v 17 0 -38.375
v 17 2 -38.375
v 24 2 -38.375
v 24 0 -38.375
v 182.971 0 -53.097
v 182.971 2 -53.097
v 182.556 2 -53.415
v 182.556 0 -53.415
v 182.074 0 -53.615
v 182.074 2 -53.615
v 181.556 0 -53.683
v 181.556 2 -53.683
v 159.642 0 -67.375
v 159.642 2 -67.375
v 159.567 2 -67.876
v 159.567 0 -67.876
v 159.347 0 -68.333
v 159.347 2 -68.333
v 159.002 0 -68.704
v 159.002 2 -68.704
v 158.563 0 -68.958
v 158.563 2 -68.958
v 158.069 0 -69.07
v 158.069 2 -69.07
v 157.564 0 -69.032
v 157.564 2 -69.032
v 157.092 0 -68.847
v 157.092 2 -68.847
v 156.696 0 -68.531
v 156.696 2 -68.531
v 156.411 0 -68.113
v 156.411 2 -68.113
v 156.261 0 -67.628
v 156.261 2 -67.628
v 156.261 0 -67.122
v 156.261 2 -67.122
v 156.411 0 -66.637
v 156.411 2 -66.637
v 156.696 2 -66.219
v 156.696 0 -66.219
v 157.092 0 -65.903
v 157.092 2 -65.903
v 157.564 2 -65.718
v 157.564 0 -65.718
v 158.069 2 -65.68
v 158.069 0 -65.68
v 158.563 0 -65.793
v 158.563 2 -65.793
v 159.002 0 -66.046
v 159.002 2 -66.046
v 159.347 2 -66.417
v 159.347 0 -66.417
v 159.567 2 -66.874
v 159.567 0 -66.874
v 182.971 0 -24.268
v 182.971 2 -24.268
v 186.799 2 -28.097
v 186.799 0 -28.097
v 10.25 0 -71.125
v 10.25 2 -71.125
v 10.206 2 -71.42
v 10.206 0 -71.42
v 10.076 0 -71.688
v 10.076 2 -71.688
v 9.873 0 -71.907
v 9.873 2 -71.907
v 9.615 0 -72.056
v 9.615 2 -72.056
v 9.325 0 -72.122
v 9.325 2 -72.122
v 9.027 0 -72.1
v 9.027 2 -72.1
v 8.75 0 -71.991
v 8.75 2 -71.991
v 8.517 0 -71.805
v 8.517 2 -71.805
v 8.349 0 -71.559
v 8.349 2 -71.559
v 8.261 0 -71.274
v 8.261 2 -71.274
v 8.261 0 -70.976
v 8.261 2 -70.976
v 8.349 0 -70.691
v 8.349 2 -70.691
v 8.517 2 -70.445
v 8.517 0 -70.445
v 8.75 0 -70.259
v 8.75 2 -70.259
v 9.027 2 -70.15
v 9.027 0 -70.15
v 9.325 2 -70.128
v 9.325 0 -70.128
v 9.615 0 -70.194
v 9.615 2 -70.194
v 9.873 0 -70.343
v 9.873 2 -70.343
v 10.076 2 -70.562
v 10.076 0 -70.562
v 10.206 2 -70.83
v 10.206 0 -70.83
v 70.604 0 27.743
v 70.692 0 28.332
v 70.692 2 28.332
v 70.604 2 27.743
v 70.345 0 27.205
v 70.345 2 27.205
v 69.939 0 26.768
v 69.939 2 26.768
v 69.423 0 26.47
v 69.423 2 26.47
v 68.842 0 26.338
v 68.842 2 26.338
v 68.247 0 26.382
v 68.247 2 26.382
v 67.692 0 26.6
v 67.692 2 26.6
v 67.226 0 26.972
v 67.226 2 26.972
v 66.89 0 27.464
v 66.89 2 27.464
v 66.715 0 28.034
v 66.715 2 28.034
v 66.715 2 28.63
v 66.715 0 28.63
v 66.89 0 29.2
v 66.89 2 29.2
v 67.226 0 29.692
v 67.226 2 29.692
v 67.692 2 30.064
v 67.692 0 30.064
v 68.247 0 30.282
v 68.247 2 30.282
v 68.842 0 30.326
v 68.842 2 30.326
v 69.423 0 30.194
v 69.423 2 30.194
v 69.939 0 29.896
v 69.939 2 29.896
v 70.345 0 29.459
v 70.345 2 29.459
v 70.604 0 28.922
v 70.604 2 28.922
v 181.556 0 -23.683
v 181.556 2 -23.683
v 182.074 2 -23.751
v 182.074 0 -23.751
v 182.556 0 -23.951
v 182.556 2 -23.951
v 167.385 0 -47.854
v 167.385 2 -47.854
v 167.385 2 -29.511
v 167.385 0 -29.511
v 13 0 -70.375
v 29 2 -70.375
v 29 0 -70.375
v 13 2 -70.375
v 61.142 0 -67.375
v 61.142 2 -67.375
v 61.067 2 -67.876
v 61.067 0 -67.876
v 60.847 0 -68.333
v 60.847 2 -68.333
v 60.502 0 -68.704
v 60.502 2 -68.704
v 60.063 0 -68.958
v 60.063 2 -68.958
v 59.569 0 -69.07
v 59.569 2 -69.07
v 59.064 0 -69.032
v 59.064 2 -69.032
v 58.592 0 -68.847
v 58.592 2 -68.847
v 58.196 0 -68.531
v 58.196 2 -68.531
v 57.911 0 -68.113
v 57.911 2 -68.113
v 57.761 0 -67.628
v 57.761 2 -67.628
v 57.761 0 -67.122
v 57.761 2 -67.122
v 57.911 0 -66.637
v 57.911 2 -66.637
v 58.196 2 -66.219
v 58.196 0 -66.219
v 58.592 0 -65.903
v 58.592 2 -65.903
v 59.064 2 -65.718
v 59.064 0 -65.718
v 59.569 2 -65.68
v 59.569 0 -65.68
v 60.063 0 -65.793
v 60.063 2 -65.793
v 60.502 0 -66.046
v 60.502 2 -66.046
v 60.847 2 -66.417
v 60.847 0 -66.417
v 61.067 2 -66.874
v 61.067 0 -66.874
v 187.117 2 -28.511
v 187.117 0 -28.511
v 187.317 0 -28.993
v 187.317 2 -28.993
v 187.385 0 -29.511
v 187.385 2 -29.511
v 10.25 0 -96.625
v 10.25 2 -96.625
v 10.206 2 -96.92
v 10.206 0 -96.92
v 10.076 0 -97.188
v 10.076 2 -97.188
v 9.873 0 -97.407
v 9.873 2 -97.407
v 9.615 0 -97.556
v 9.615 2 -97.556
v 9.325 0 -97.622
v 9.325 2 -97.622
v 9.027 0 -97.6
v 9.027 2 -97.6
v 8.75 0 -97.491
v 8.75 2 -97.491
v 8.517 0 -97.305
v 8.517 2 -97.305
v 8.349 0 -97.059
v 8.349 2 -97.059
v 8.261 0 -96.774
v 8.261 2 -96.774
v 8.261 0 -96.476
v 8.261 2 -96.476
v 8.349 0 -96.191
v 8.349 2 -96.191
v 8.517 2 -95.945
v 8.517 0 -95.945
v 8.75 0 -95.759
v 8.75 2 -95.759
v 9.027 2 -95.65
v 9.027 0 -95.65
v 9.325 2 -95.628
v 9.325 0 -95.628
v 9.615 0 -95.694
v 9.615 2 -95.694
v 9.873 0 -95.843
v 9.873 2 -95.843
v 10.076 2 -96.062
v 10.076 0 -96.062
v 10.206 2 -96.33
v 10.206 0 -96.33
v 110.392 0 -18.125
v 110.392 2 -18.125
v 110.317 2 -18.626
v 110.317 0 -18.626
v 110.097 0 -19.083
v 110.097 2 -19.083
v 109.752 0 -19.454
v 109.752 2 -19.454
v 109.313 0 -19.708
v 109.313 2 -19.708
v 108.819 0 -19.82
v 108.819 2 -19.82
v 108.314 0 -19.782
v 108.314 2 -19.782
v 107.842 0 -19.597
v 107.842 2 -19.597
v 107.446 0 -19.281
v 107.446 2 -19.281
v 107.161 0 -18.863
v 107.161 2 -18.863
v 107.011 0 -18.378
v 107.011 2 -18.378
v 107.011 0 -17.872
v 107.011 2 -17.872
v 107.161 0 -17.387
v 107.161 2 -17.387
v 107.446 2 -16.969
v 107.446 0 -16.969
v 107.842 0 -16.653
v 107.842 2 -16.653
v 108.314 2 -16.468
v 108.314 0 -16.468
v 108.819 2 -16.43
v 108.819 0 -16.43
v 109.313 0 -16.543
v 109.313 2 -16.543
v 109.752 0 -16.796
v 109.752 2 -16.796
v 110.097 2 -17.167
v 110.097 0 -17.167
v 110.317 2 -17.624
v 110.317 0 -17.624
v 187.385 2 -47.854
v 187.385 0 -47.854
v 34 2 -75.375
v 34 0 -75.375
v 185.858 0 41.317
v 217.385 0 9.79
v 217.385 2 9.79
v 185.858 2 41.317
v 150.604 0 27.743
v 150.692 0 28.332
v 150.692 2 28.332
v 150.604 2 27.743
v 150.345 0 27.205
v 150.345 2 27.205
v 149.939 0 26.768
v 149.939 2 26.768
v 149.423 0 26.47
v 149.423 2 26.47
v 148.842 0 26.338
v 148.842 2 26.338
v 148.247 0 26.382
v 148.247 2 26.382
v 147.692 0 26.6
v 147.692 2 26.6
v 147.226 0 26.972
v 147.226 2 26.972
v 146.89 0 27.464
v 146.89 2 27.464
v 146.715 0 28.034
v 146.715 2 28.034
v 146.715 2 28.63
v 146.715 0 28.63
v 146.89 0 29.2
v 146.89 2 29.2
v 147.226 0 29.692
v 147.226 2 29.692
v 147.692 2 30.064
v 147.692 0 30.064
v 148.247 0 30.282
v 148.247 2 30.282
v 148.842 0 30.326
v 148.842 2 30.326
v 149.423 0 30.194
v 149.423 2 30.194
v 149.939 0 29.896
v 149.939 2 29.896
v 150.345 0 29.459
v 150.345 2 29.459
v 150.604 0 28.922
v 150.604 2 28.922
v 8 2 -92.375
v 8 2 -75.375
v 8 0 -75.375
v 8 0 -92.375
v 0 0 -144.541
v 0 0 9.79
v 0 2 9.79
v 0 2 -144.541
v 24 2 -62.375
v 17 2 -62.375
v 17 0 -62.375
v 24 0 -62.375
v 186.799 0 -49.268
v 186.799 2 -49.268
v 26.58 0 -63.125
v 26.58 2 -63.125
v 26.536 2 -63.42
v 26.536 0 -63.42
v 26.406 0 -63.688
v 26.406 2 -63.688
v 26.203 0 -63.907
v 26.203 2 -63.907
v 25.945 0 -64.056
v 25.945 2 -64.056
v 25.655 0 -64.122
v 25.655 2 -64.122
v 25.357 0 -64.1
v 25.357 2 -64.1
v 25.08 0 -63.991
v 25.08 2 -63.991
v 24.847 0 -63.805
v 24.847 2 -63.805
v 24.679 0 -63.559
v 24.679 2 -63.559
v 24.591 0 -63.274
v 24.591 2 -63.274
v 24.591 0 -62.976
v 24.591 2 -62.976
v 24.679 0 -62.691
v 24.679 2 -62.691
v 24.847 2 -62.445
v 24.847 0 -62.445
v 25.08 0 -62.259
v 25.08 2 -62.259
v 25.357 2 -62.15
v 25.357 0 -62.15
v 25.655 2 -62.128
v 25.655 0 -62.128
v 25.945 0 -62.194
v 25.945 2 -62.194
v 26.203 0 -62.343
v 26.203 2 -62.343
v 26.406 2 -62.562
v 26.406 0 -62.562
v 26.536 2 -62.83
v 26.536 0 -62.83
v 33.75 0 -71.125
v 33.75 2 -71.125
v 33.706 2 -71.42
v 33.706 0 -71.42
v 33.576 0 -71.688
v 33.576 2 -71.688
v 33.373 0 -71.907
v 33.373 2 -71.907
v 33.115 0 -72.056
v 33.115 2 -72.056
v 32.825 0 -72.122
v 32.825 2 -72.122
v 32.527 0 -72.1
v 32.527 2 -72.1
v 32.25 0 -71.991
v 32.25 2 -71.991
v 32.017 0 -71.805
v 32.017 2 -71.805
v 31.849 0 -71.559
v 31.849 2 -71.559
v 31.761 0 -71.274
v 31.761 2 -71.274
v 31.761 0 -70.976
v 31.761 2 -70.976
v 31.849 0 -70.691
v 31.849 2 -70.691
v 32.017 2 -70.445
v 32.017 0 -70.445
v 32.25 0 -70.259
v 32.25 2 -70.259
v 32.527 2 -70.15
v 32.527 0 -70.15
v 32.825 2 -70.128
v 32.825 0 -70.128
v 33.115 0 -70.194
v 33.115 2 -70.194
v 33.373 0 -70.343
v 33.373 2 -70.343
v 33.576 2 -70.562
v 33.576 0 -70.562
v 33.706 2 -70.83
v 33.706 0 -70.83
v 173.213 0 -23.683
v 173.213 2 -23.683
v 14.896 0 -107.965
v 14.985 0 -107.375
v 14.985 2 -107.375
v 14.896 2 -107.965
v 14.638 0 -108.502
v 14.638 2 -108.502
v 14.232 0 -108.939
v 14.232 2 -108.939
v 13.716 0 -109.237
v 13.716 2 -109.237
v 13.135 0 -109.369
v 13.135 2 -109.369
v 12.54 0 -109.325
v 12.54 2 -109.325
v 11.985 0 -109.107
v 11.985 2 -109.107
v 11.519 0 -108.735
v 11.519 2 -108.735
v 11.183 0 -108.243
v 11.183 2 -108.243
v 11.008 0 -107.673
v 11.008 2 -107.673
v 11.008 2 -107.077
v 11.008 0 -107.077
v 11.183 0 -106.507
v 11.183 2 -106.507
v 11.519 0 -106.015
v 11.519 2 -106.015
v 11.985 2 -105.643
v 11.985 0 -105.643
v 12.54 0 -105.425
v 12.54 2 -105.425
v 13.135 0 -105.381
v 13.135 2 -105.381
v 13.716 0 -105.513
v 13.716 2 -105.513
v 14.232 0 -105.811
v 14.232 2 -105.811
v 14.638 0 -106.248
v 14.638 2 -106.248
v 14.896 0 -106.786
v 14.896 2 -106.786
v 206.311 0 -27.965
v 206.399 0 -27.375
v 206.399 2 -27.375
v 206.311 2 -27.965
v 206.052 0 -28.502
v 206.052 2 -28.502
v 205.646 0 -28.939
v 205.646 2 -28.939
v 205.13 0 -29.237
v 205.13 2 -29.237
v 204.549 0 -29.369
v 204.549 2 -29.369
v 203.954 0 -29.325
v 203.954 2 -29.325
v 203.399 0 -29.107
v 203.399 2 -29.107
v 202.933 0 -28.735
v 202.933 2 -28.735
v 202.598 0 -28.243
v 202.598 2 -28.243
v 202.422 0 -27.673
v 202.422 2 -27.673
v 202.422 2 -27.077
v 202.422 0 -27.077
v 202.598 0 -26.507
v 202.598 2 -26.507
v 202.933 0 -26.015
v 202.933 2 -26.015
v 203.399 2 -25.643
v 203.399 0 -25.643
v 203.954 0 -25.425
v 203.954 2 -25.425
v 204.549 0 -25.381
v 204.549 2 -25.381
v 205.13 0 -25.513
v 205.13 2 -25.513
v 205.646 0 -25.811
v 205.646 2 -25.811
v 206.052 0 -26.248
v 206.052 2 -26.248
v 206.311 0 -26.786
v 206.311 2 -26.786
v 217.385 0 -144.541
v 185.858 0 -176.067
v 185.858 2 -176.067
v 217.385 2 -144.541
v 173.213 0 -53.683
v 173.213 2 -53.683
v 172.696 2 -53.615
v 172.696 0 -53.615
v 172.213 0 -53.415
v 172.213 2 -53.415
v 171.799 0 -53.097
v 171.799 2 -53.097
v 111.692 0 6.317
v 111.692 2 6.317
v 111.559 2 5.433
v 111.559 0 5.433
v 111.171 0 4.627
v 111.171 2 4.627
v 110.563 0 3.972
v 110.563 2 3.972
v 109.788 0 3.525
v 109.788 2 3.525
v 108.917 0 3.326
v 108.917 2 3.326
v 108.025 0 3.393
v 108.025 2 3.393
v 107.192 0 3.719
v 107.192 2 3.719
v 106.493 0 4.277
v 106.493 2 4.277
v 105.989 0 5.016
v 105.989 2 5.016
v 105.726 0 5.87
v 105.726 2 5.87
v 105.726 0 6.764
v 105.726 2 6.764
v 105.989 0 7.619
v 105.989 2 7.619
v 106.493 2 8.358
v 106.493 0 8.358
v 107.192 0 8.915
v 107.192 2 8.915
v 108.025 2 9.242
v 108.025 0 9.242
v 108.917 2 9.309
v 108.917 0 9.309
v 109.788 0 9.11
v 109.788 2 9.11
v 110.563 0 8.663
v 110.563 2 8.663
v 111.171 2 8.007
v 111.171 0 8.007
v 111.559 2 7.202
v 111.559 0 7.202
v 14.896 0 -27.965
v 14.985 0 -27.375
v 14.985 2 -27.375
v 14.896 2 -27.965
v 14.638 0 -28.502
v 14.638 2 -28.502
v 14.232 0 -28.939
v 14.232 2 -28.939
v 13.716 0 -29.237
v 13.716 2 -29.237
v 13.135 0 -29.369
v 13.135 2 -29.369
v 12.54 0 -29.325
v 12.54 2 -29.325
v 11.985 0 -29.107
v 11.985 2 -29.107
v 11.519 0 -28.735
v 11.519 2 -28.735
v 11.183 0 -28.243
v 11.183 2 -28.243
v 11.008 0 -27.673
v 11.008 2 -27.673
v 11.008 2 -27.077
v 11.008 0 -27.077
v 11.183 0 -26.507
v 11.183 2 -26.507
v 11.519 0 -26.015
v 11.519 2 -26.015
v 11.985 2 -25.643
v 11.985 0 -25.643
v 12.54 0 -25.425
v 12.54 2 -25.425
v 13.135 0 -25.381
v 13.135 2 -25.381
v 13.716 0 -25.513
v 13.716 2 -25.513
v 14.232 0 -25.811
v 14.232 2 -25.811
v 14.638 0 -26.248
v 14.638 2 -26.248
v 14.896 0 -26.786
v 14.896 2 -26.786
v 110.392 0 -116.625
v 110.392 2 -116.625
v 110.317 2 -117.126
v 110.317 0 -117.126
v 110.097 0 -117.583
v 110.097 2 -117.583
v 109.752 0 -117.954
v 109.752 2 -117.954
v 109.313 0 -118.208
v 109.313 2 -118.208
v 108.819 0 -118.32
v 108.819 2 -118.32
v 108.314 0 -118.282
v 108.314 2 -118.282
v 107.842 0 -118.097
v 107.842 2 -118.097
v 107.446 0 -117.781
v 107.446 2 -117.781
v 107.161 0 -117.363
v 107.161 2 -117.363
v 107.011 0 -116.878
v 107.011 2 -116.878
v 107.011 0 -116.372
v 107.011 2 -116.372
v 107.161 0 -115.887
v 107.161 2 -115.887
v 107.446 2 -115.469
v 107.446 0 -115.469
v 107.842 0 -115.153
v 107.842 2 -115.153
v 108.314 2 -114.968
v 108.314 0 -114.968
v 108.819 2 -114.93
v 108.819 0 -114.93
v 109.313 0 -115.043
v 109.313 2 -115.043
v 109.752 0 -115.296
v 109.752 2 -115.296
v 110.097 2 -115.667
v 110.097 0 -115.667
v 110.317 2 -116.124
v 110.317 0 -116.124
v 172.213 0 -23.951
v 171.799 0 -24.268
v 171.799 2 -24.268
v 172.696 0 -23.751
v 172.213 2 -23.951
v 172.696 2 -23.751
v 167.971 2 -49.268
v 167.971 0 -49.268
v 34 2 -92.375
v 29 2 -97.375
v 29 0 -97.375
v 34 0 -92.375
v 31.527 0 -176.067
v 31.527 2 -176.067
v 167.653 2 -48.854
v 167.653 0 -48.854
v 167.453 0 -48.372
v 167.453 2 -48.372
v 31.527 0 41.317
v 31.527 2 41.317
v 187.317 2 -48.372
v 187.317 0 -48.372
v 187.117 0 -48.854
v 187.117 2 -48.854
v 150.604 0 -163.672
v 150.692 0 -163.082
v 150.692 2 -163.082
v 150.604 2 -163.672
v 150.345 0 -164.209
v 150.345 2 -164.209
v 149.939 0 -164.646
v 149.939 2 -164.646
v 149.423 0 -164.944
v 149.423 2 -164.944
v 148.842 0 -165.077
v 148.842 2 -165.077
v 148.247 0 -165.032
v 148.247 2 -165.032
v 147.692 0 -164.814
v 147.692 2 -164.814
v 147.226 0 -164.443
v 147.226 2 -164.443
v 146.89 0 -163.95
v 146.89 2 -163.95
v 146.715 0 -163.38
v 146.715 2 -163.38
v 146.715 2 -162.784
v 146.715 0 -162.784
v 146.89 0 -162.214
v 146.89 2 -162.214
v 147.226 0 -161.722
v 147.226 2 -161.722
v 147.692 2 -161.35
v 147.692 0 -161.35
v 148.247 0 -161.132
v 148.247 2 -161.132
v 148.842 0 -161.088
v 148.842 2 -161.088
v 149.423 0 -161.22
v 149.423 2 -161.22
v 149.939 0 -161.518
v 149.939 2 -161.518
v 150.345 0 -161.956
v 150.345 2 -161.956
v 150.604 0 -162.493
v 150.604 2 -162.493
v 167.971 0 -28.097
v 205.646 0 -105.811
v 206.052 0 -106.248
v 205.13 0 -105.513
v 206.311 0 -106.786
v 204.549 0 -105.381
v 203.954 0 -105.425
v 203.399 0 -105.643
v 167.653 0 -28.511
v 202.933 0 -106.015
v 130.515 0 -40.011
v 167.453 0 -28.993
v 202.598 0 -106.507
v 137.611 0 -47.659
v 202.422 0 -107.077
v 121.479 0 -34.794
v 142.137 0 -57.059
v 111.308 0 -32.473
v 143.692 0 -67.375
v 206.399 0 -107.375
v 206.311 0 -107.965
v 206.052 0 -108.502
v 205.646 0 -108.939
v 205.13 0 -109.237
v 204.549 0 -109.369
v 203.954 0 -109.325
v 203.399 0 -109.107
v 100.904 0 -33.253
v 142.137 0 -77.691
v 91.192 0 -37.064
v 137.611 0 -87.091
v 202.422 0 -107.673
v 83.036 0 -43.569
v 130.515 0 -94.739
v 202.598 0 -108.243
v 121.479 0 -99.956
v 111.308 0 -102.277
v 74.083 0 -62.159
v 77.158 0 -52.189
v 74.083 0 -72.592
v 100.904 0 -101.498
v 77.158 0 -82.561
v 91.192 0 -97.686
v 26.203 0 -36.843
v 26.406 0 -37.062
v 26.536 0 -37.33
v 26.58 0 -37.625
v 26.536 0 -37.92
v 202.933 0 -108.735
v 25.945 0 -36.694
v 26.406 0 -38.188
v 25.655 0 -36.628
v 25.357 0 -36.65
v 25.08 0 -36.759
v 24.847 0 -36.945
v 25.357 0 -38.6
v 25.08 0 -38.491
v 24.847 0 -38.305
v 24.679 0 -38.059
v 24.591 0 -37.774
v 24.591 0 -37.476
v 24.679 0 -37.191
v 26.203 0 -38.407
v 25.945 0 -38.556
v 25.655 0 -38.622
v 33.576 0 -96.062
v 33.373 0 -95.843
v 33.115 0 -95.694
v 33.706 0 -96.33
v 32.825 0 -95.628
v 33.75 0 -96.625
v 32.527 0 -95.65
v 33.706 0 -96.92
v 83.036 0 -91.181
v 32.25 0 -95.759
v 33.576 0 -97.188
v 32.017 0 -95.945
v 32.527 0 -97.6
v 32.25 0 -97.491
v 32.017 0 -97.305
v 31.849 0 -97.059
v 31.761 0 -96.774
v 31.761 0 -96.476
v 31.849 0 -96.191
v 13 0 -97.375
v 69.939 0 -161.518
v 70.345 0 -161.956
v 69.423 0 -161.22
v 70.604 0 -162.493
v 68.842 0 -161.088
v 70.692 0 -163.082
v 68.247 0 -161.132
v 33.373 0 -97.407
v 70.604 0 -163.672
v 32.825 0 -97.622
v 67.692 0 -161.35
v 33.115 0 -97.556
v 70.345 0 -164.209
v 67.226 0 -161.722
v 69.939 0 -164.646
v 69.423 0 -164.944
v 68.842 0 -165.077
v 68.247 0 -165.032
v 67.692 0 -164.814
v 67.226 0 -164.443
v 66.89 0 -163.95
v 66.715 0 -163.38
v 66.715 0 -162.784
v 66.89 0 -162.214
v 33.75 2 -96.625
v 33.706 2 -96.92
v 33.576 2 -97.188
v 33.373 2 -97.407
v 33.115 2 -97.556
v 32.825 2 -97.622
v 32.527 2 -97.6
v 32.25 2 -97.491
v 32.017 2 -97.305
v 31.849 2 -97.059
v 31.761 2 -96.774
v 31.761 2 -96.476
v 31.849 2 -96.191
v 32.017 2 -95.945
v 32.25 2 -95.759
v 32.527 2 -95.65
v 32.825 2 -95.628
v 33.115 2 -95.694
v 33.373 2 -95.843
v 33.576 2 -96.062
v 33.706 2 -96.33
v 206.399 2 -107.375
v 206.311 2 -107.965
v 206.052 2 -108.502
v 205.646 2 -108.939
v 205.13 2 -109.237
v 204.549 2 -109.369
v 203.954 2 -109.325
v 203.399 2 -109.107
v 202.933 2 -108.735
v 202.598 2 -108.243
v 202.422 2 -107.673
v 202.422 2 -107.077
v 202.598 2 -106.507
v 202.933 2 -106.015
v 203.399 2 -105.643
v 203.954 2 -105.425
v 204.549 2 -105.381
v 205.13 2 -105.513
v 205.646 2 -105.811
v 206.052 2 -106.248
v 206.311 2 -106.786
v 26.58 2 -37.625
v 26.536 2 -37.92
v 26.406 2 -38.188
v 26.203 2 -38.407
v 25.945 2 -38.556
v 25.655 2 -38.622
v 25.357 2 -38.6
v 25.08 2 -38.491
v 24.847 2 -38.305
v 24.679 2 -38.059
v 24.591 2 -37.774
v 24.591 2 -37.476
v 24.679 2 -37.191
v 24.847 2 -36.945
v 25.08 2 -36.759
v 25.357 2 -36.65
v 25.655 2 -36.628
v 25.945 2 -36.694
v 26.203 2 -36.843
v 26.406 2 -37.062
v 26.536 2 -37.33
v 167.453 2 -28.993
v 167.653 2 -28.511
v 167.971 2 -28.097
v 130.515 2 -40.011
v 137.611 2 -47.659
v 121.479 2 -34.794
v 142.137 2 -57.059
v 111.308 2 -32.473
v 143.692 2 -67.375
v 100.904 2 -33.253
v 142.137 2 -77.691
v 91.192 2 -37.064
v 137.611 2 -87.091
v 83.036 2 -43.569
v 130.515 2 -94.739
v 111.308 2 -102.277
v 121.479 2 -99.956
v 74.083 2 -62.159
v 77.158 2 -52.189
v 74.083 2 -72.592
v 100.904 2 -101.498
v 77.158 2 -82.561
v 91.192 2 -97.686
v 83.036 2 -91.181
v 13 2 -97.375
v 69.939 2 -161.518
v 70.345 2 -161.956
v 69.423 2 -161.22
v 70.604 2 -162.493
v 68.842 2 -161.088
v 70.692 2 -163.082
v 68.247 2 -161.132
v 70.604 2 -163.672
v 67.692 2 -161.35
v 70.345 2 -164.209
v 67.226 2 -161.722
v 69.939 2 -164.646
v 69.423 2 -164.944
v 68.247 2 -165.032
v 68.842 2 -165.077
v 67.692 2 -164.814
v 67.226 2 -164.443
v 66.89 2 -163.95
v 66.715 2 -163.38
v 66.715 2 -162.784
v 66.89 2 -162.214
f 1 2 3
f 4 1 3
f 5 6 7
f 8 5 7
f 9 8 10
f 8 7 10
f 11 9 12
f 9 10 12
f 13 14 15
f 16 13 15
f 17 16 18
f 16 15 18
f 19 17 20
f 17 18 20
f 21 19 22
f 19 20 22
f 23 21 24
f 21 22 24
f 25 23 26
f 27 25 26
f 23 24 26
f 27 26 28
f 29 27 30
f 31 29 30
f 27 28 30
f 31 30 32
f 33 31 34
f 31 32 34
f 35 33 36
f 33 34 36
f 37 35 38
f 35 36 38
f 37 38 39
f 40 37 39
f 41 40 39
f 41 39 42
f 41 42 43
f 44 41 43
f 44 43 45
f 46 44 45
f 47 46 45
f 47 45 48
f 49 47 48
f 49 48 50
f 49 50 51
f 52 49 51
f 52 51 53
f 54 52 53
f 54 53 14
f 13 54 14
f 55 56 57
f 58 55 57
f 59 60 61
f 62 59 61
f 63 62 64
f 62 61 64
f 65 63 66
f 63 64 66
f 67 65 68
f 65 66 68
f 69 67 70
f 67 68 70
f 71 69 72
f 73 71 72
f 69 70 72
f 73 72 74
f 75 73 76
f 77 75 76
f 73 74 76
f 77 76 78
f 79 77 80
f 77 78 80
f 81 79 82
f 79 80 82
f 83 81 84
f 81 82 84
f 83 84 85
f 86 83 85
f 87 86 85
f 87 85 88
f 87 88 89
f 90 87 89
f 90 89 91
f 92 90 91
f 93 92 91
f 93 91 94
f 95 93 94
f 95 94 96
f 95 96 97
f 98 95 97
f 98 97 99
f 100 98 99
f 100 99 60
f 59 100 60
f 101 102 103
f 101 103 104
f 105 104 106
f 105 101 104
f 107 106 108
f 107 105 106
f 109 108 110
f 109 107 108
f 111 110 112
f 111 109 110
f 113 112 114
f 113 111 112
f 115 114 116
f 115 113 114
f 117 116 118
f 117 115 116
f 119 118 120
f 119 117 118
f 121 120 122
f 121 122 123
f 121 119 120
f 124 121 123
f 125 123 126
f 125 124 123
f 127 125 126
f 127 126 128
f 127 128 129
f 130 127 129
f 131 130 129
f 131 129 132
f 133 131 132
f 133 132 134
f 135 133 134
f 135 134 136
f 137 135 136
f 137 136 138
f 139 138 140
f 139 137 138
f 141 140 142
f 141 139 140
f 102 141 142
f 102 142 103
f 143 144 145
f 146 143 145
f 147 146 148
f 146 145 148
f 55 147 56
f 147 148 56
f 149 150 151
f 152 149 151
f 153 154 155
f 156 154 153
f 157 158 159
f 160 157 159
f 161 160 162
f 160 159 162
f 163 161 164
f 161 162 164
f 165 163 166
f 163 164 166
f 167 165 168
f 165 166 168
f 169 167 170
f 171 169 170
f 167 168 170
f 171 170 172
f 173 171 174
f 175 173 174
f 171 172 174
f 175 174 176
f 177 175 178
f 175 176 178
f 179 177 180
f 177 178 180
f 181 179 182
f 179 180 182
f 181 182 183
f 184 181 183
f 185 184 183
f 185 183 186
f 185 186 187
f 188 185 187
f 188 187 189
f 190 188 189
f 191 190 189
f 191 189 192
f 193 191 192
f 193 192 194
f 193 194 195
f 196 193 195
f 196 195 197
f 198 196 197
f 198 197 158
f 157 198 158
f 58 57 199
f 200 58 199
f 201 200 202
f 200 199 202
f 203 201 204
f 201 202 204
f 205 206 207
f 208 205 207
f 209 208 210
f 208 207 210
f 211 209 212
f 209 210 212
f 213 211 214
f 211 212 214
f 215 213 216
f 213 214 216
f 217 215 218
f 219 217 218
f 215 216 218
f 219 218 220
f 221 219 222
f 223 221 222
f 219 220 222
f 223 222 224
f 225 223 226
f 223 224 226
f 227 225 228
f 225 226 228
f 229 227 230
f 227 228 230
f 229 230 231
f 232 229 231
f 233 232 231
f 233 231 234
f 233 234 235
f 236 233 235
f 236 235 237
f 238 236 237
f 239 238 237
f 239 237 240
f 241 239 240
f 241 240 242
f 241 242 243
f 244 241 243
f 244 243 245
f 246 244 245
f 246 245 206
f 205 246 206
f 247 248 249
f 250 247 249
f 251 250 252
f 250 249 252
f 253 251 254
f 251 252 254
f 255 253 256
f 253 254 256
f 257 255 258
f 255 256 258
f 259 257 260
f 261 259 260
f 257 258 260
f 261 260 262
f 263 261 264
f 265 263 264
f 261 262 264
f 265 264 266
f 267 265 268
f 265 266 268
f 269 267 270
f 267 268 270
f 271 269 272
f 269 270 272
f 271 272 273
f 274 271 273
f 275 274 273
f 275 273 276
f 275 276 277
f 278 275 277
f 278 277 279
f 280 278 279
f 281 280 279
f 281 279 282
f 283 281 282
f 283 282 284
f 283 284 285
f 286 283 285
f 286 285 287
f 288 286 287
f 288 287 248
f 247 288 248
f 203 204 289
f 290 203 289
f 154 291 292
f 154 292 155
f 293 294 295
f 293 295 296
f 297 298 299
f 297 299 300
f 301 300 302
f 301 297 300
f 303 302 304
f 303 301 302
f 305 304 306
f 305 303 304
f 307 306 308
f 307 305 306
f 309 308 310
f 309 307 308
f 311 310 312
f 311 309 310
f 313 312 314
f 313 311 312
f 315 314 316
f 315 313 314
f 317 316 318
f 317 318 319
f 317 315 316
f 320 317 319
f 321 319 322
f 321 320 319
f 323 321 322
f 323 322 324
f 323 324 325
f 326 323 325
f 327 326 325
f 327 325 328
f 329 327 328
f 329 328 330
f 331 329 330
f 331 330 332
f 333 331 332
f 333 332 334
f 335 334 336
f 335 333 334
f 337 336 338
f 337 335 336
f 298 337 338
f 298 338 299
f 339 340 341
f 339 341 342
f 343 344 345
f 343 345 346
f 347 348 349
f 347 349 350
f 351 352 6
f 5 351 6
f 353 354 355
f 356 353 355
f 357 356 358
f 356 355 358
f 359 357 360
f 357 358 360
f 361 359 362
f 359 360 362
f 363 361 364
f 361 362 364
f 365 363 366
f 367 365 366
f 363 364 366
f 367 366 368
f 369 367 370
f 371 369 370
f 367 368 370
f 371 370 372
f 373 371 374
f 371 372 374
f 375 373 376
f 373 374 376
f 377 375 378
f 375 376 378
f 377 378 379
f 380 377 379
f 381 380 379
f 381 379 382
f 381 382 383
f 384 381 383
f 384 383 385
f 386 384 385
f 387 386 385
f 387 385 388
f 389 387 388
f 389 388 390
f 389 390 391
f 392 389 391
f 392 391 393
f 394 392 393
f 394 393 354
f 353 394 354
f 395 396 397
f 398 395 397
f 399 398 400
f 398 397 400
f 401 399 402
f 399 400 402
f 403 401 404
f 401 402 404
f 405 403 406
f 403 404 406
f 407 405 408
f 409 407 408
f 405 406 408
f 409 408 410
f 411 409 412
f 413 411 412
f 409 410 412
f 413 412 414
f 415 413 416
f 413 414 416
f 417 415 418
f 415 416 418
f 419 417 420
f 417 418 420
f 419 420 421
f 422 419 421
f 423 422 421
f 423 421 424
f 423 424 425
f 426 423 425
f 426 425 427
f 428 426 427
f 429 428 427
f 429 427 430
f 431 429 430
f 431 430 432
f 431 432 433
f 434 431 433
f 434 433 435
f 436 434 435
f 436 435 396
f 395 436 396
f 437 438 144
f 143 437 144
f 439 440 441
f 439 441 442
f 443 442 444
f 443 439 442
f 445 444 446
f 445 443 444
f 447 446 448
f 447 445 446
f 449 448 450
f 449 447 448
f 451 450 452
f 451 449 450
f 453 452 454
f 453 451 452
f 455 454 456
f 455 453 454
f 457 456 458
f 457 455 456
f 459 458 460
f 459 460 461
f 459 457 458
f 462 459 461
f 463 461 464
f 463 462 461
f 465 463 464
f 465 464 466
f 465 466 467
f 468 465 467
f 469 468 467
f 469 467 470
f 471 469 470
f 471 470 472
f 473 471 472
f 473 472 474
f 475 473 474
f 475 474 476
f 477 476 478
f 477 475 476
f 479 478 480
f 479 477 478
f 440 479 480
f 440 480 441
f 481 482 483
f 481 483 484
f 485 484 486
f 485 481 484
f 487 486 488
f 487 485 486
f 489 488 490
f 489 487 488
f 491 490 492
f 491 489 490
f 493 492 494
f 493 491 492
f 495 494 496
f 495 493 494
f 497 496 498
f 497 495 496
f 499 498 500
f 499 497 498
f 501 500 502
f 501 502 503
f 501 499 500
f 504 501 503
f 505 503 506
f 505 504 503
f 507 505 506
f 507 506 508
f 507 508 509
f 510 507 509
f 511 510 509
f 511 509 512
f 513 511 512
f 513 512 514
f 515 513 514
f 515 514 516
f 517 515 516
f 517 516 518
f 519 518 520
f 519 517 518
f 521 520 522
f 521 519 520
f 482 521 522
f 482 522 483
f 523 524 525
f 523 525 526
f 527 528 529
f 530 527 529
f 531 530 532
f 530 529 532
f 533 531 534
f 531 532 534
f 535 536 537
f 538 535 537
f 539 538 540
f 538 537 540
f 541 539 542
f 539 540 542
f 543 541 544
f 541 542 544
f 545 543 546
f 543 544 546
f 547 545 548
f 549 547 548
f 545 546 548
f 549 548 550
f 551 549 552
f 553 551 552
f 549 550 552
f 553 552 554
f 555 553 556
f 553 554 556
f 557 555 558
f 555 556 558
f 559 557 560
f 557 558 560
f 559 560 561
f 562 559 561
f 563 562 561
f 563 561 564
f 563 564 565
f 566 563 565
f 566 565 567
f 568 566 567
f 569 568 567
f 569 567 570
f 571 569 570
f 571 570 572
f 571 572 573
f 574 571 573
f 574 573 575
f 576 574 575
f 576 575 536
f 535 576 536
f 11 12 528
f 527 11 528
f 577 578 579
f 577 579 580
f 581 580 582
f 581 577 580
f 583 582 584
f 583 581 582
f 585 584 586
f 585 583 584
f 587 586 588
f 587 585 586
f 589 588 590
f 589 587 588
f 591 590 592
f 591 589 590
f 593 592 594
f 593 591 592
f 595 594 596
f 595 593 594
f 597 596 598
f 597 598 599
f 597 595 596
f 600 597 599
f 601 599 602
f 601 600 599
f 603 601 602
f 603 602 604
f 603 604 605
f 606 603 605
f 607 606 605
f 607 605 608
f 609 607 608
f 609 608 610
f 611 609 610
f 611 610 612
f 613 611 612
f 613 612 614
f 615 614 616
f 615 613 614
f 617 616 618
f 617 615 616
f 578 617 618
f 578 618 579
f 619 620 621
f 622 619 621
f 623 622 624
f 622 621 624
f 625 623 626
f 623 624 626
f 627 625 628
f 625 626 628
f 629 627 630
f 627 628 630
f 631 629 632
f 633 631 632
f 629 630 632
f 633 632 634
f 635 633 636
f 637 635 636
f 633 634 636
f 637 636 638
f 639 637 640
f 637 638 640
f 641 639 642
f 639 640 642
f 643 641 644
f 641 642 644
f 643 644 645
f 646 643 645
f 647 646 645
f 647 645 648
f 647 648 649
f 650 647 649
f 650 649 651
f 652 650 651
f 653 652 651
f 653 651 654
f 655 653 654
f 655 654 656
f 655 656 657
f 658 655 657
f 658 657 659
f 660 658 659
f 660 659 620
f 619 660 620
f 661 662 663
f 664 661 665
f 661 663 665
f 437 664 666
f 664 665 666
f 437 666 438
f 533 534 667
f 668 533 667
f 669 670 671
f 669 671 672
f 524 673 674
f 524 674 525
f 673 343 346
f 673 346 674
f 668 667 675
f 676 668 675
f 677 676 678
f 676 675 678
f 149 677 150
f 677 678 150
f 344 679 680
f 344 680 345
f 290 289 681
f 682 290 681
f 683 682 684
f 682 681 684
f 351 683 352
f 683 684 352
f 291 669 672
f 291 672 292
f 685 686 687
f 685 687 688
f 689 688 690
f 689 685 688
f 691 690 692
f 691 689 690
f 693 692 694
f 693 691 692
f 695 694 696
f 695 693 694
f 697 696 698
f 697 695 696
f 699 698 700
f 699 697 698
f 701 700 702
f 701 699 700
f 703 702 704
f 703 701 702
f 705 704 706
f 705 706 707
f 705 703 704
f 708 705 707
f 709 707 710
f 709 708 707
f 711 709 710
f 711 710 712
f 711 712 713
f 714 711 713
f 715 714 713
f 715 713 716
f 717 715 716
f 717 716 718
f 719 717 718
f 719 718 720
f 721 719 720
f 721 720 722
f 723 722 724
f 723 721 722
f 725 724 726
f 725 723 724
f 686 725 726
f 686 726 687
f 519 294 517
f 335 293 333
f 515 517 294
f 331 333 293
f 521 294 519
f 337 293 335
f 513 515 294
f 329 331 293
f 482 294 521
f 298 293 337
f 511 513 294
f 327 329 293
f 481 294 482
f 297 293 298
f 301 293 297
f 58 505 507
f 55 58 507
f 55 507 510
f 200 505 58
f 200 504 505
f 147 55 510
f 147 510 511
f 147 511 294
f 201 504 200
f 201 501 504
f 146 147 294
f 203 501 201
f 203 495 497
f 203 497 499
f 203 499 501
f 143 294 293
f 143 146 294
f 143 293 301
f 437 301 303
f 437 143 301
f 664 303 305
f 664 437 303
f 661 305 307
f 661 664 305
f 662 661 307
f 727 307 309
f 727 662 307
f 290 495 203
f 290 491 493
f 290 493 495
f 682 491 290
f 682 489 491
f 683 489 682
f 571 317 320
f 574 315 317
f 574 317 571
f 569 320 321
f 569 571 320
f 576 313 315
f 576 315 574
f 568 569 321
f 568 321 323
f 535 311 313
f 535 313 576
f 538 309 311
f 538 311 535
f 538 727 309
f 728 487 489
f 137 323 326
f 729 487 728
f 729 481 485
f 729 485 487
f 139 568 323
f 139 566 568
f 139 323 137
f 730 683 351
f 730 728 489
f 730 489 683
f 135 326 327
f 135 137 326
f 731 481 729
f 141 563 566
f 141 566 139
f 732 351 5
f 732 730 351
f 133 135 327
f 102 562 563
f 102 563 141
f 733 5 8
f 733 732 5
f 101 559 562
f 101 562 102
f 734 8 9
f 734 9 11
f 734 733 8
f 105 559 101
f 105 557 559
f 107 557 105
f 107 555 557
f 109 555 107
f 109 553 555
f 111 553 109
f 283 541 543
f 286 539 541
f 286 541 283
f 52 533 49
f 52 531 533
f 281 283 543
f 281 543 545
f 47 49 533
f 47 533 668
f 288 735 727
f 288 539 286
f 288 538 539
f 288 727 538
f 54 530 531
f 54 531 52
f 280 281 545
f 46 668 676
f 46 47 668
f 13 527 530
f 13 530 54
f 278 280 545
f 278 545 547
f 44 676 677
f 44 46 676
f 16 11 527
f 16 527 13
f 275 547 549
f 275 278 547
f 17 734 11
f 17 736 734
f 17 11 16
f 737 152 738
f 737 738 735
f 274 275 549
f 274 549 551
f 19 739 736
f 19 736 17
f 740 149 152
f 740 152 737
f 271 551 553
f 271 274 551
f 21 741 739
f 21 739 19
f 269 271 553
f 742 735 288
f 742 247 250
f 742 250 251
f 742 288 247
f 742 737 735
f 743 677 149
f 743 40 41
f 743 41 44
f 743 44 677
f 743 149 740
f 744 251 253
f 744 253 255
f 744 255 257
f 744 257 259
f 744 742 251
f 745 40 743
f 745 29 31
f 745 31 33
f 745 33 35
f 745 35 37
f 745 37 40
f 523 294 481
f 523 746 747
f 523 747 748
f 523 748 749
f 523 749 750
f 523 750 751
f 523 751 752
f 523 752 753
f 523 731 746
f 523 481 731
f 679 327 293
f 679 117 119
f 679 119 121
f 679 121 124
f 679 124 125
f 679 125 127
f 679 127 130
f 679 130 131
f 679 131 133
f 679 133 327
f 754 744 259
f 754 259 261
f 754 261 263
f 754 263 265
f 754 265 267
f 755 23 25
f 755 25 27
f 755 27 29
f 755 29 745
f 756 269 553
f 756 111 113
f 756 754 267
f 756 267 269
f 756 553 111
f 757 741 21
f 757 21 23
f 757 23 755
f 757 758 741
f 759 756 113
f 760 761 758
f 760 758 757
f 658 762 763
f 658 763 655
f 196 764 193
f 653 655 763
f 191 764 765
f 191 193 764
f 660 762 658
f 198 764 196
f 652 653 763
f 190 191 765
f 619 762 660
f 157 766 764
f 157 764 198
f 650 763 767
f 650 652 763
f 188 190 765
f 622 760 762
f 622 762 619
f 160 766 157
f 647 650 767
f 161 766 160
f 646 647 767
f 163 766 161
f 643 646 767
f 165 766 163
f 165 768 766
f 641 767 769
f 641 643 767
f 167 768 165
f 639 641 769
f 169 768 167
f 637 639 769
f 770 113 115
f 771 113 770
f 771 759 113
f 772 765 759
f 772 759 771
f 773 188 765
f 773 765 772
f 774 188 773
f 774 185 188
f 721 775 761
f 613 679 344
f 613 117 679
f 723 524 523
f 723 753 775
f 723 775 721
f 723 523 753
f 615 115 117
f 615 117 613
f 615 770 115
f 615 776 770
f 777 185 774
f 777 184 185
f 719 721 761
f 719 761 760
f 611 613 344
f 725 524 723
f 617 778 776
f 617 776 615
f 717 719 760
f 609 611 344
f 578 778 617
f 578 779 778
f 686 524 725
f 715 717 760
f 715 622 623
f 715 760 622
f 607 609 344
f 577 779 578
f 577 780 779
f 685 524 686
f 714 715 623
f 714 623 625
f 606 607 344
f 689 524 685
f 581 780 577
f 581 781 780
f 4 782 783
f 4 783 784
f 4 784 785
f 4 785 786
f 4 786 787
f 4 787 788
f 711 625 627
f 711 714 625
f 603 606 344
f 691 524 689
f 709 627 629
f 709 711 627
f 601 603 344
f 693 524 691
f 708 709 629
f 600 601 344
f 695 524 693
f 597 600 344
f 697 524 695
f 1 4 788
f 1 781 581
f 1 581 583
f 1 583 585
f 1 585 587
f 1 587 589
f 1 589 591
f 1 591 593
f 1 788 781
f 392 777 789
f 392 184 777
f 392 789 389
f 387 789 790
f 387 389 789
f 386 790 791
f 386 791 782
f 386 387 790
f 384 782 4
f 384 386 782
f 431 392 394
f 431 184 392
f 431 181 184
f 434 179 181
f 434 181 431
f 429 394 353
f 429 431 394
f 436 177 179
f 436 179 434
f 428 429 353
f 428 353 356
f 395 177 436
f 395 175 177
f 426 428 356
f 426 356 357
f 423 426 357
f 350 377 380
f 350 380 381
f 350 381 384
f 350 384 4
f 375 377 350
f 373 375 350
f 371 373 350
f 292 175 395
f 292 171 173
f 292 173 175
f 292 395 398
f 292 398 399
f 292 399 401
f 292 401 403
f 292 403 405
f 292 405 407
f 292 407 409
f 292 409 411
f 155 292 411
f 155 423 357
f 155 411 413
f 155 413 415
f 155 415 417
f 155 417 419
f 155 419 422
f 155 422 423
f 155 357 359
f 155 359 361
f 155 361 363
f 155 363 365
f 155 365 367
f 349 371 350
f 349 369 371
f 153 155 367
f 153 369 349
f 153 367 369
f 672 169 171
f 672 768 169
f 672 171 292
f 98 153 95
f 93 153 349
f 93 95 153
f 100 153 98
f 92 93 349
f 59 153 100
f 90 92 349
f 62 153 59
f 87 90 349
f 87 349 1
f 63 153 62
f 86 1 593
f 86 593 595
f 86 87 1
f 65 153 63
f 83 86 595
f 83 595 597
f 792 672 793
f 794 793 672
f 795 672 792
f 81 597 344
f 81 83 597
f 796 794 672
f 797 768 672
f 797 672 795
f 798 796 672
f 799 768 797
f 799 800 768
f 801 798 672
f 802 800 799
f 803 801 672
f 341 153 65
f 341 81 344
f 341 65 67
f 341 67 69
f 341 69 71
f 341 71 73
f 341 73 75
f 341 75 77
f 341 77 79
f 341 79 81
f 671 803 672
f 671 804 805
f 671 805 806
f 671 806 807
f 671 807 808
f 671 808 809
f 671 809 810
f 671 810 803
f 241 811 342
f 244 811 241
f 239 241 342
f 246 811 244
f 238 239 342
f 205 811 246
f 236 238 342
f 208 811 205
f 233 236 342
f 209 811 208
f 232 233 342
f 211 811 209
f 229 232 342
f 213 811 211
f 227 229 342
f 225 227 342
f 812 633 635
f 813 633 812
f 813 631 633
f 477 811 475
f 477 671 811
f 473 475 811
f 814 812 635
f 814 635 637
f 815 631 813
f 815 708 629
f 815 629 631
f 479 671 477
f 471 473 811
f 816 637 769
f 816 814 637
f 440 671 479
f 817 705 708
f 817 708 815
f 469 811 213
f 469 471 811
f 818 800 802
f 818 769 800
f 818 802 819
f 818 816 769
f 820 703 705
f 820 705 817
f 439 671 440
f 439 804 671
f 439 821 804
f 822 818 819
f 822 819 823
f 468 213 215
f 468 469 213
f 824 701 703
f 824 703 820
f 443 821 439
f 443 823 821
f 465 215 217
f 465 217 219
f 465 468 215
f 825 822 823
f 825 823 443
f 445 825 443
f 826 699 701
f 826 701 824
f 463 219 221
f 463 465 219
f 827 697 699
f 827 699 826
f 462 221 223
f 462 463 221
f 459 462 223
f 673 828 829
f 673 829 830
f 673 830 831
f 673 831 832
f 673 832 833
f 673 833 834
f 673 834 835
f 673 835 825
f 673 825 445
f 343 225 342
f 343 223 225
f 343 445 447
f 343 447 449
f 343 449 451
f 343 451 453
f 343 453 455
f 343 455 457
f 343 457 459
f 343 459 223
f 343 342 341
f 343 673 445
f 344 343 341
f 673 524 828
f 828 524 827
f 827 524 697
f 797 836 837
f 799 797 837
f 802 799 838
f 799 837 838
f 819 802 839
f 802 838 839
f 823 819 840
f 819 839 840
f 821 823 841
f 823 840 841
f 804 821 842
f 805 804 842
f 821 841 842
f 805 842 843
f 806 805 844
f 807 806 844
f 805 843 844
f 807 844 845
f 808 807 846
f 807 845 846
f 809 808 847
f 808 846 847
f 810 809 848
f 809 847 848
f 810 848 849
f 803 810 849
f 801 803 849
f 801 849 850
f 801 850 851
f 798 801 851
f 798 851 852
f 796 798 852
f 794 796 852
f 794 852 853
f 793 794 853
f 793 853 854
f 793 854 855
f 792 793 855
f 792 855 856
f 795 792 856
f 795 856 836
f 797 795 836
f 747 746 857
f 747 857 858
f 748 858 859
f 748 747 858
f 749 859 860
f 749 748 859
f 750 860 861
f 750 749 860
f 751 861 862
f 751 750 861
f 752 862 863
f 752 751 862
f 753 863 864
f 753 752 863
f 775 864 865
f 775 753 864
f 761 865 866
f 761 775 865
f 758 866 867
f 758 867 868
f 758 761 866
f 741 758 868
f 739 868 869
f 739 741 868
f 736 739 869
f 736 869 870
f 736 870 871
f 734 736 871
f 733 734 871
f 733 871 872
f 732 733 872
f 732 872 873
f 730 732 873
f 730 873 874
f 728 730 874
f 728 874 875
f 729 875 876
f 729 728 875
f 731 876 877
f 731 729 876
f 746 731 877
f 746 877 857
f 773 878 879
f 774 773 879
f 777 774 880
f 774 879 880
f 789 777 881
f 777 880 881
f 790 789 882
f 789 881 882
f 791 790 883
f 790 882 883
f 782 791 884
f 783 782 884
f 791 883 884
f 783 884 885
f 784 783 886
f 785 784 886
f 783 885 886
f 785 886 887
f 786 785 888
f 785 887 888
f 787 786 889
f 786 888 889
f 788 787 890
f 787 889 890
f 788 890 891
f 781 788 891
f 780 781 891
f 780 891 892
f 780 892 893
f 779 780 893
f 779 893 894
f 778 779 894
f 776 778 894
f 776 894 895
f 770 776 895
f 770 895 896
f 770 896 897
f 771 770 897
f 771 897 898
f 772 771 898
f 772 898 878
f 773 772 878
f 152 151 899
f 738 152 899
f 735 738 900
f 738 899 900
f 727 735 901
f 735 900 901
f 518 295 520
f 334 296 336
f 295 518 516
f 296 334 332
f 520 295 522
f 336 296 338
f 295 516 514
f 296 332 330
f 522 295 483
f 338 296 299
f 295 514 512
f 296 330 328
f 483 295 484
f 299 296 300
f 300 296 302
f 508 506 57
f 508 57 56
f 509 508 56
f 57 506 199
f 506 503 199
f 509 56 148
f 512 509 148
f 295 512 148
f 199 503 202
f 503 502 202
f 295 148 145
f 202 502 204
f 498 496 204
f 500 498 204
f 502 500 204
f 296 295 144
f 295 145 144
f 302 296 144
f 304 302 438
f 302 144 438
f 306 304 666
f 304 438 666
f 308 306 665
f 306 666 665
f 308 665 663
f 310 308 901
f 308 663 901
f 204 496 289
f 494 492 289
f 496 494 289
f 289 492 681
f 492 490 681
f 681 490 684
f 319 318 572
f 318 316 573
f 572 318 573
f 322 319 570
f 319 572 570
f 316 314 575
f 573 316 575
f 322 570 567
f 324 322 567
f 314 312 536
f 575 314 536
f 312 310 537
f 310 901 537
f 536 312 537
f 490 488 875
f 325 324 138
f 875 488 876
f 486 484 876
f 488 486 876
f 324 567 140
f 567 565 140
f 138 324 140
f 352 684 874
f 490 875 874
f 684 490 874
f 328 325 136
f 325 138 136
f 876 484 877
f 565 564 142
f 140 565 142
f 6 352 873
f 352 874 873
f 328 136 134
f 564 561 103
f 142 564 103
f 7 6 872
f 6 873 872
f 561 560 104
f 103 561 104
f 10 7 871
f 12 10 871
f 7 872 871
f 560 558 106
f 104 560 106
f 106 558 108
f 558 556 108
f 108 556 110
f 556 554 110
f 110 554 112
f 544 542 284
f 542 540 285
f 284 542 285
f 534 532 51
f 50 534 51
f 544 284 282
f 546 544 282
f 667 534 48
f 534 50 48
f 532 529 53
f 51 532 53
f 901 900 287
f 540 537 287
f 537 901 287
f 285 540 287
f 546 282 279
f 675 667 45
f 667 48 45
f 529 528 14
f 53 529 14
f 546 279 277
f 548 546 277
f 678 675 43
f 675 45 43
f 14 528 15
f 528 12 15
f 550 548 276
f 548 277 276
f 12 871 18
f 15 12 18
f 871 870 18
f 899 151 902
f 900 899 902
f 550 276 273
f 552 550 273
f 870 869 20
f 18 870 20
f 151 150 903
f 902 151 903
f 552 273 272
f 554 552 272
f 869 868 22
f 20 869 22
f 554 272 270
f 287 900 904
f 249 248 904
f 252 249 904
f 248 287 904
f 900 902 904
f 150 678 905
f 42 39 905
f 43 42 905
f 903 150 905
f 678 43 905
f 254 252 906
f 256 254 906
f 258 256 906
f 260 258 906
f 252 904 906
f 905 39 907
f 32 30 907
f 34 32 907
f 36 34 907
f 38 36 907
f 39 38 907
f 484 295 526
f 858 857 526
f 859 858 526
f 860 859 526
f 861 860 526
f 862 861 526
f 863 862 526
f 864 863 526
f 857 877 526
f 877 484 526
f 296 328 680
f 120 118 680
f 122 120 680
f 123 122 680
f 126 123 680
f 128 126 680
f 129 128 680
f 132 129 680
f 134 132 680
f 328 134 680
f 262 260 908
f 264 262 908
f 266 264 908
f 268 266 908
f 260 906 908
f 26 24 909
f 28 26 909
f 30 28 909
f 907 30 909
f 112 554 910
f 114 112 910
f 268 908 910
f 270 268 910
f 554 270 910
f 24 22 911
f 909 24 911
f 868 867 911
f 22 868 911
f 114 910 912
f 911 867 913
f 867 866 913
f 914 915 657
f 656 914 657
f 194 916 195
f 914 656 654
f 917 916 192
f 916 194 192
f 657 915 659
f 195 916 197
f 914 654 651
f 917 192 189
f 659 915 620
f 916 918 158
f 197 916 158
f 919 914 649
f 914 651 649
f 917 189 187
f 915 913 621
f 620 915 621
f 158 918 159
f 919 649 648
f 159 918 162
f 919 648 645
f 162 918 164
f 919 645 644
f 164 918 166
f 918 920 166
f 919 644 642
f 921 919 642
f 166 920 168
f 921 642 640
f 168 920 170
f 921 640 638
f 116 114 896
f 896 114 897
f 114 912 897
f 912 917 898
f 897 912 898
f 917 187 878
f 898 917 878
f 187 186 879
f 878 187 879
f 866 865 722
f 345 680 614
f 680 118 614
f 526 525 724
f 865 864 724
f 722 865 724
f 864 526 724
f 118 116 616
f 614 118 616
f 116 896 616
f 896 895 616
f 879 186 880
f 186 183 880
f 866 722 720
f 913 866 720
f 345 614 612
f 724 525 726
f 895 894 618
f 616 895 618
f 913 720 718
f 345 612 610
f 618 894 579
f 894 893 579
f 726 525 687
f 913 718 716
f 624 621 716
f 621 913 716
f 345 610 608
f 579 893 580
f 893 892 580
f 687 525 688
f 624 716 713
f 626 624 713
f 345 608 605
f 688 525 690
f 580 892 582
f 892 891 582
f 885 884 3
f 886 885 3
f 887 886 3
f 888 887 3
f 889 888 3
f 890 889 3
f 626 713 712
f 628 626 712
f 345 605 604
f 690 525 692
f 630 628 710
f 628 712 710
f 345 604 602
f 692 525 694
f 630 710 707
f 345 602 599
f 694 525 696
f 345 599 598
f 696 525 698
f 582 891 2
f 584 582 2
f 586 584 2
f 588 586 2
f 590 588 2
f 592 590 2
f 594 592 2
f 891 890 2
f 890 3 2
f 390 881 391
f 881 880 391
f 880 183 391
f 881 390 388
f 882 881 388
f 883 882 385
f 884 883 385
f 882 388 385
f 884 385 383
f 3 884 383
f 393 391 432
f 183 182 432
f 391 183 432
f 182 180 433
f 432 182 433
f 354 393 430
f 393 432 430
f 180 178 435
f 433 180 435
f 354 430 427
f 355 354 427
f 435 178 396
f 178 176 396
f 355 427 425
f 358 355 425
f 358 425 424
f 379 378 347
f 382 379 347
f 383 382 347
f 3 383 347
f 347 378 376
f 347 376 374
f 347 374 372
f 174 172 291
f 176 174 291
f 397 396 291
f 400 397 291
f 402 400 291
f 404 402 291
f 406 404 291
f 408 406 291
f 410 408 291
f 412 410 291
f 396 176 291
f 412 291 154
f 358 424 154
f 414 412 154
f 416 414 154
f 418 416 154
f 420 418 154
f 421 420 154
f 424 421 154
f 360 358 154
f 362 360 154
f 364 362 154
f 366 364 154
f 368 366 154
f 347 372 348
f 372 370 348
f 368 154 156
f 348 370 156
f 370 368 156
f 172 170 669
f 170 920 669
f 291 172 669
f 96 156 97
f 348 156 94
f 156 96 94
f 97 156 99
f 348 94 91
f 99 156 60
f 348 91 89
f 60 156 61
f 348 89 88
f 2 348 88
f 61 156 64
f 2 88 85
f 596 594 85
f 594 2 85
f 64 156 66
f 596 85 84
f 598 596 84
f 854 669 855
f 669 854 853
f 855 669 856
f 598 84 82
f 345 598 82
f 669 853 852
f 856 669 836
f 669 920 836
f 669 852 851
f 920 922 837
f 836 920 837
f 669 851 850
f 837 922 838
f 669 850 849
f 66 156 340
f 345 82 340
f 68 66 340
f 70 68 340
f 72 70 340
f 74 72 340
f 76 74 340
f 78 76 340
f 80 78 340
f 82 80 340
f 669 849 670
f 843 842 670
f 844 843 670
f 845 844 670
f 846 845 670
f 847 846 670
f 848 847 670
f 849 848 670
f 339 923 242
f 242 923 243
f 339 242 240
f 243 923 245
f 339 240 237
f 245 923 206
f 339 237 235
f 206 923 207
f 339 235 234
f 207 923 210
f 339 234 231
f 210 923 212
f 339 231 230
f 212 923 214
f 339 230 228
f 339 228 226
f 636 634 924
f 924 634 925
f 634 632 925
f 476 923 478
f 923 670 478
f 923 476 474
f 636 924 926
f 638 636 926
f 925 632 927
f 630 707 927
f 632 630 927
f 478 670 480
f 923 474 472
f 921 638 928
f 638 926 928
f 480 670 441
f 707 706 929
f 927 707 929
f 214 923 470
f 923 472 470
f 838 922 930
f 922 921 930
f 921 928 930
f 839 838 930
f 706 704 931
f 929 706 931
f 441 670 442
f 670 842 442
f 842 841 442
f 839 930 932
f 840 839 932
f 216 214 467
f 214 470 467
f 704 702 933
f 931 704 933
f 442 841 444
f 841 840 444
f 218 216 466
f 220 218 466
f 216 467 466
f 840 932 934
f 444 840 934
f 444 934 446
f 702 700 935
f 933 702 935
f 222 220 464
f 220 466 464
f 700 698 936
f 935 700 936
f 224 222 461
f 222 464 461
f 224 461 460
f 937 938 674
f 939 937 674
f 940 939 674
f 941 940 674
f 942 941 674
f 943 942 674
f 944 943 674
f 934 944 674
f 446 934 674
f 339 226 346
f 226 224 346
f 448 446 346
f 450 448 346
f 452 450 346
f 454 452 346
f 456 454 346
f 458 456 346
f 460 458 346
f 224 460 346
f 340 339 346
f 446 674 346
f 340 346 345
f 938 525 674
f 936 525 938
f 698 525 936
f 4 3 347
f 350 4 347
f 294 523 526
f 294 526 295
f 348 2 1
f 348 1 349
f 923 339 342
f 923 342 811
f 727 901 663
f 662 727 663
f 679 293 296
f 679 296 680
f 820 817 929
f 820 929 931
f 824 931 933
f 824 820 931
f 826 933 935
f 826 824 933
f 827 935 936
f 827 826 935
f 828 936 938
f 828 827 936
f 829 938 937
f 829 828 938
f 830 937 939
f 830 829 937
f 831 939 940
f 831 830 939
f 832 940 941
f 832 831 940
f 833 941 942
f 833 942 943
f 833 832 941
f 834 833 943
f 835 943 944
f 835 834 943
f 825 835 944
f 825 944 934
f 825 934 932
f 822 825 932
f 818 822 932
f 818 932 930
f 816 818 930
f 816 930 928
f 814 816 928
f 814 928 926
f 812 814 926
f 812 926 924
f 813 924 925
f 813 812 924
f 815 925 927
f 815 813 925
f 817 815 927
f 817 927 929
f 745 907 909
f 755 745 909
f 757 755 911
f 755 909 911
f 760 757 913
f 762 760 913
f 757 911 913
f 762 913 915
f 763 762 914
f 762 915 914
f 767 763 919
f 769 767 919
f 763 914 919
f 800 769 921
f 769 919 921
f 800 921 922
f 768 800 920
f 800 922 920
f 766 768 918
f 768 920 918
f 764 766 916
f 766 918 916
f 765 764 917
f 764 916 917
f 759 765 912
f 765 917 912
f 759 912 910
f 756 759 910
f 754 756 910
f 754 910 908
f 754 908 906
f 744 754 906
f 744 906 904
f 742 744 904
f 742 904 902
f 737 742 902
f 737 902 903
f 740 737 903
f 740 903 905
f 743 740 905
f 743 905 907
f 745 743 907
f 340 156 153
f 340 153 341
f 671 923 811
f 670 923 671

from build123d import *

# Parameters (mm, degrees)
SKETCH_1_R          = 2
EXTRUDE_1_DEPTH     = 2
SKETCH_2_R          = 1
SKETCH_2_R_2        = 1.7
SKETCH_2_R_3        = 35
SKETCH_2_R_4        = 3
SKETCH_2_W          = 7
SKETCH_2_H          = 24
CUT_EXTRUDE_1_DEPTH = 10


with BuildPart() as part:
    # 草图1 → 凸台-拉伸1 (new body)
    with BuildSketch(Plane(origin=(0, 0, 0), x_dir=(1, 0, 0), z_dir=(0, 1, 0))):
        Polygon((0, -9.790421162), (0, 144.54053128), (31.526911935, 176.067443214), (185.857864376, 176.067443214), (217.384776311, 144.54053128), (217.384776311, -9.790421162), (185.857864376, -41.317333096), (31.526911935, -41.317333096), align=None)
        with Locations((68.692388155, 163.08216184)):
            Circle(SKETCH_1_R, mode=Mode.SUBTRACT)
        with Locations((148.692388155, 163.08216184)):
            Circle(SKETCH_1_R, mode=Mode.SUBTRACT)
        with Locations((204.399494937, 107.375055059)):
            Circle(SKETCH_1_R, mode=Mode.SUBTRACT)
        with Locations((204.399494937, 27.375055059)):
            Circle(SKETCH_1_R, mode=Mode.SUBTRACT)
        with Locations((148.692388155, -28.332051722)):
            Circle(SKETCH_1_R, mode=Mode.SUBTRACT)
        with Locations((68.692388155, -28.332051722)):
            Circle(SKETCH_1_R, mode=Mode.SUBTRACT)
        with Locations((12.985281374, 27.375055059)):
            Circle(SKETCH_1_R, mode=Mode.SUBTRACT)
        with Locations((12.985281374, 107.375055059)):
            Circle(SKETCH_1_R, mode=Mode.SUBTRACT)
    extrude(amount=EXTRUDE_1_DEPTH)

    # 草图2 → 切除-拉伸1 (cut)
    with BuildSketch(Plane(origin=(0, 2, 0), x_dir=(1, 0, 0), z_dir=(0, 1, 0))):
        with Locations((9.25, 96.625055059)):
            Circle(SKETCH_2_R)
        with Locations((108.692388155, 116.625055059)):
            Circle(SKETCH_2_R_2)
        with Locations((108.692388155, 18.125055059)):
            Circle(SKETCH_2_R_2)
        with Locations((157.942388155, 67.375055059)):
            Circle(SKETCH_2_R_2)
        with Locations((59.442388155, 67.375055059)):
            Circle(SKETCH_2_R_2)
        with Locations((108.692388155, 67.375055059)):
            Circle(SKETCH_2_R_3)
        with Locations((32.75, 96.625055059)):
            Circle(SKETCH_2_R)
        with Locations((32.75, 71.125055059)):
            Circle(SKETCH_2_R)
        with Locations((9.25, 71.125055059)):
            Circle(SKETCH_2_R)
        with Locations((25.58, 63.125055059)):
            Circle(SKETCH_2_R)
        with Locations((25.58, 37.625055059)):
            Circle(SKETCH_2_R)
        with Locations((108.692388155, -6.317333096)):
            Circle(SKETCH_2_R_4)
        Polygon((29, 97.375055059), (34, 92.375055059), (34, 75.375055059), (29, 70.375055059), (13, 70.375055059), (8, 75.375055059), (8, 92.375055059), (13, 97.375055059), align=None)
        with Locations((20.5, 50.375055059)):
            Rectangle(SKETCH_2_W, SKETCH_2_H)
        with BuildLine():
            Line((173.213203436, 23.682666904), (181.556349186, 23.682666904))
            ThreePointArc((181.556349186, 23.682666904), (182.321716051, 23.834907839), (182.970562748, 24.268453341))
            Line((182.970562748, 24.268453341), (186.798989873, 28.096880466))
            ThreePointArc((186.798989873, 28.096880466), (187.232535376, 28.745727164), (187.384776311, 29.511094028))
            Line((187.384776311, 29.511094028), (187.384776311, 47.854239779))
            ThreePointArc((187.384776311, 47.854239779), (187.232535376, 48.619606644), (186.798989873, 49.268453341))
            Line((186.798989873, 49.268453341), (182.970562748, 53.096880466))
            ThreePointArc((182.970562748, 53.096880466), (182.321716051, 53.530425969), (181.556349186, 53.682666904))
            Line((181.556349186, 53.682666904), (173.213203436, 53.682666904))
            ThreePointArc((173.213203436, 53.682666904), (172.447836571, 53.530425969), (171.798989873, 53.096880466))
            Line((171.798989873, 53.096880466), (167.970562748, 49.268453341))
            ThreePointArc((167.970562748, 49.268453341), (167.537017246, 48.619606644), (167.384776311, 47.854239779))
            Line((167.384776311, 47.854239779), (167.384776311, 29.511094028))
            ThreePointArc((167.384776311, 29.511094028), (167.537017246, 28.745727164), (167.970562748, 28.096880466))
            Line((167.970562748, 28.096880466), (171.798989873, 24.268453341))
            ThreePointArc((171.798989873, 24.268453341), (172.447836571, 23.834907839), (173.213203436, 23.682666904))
        make_face()
    extrude(amount=-CUT_EXTRUDE_1_DEPTH, mode=Mode.SUBTRACT)


solid = part.part
